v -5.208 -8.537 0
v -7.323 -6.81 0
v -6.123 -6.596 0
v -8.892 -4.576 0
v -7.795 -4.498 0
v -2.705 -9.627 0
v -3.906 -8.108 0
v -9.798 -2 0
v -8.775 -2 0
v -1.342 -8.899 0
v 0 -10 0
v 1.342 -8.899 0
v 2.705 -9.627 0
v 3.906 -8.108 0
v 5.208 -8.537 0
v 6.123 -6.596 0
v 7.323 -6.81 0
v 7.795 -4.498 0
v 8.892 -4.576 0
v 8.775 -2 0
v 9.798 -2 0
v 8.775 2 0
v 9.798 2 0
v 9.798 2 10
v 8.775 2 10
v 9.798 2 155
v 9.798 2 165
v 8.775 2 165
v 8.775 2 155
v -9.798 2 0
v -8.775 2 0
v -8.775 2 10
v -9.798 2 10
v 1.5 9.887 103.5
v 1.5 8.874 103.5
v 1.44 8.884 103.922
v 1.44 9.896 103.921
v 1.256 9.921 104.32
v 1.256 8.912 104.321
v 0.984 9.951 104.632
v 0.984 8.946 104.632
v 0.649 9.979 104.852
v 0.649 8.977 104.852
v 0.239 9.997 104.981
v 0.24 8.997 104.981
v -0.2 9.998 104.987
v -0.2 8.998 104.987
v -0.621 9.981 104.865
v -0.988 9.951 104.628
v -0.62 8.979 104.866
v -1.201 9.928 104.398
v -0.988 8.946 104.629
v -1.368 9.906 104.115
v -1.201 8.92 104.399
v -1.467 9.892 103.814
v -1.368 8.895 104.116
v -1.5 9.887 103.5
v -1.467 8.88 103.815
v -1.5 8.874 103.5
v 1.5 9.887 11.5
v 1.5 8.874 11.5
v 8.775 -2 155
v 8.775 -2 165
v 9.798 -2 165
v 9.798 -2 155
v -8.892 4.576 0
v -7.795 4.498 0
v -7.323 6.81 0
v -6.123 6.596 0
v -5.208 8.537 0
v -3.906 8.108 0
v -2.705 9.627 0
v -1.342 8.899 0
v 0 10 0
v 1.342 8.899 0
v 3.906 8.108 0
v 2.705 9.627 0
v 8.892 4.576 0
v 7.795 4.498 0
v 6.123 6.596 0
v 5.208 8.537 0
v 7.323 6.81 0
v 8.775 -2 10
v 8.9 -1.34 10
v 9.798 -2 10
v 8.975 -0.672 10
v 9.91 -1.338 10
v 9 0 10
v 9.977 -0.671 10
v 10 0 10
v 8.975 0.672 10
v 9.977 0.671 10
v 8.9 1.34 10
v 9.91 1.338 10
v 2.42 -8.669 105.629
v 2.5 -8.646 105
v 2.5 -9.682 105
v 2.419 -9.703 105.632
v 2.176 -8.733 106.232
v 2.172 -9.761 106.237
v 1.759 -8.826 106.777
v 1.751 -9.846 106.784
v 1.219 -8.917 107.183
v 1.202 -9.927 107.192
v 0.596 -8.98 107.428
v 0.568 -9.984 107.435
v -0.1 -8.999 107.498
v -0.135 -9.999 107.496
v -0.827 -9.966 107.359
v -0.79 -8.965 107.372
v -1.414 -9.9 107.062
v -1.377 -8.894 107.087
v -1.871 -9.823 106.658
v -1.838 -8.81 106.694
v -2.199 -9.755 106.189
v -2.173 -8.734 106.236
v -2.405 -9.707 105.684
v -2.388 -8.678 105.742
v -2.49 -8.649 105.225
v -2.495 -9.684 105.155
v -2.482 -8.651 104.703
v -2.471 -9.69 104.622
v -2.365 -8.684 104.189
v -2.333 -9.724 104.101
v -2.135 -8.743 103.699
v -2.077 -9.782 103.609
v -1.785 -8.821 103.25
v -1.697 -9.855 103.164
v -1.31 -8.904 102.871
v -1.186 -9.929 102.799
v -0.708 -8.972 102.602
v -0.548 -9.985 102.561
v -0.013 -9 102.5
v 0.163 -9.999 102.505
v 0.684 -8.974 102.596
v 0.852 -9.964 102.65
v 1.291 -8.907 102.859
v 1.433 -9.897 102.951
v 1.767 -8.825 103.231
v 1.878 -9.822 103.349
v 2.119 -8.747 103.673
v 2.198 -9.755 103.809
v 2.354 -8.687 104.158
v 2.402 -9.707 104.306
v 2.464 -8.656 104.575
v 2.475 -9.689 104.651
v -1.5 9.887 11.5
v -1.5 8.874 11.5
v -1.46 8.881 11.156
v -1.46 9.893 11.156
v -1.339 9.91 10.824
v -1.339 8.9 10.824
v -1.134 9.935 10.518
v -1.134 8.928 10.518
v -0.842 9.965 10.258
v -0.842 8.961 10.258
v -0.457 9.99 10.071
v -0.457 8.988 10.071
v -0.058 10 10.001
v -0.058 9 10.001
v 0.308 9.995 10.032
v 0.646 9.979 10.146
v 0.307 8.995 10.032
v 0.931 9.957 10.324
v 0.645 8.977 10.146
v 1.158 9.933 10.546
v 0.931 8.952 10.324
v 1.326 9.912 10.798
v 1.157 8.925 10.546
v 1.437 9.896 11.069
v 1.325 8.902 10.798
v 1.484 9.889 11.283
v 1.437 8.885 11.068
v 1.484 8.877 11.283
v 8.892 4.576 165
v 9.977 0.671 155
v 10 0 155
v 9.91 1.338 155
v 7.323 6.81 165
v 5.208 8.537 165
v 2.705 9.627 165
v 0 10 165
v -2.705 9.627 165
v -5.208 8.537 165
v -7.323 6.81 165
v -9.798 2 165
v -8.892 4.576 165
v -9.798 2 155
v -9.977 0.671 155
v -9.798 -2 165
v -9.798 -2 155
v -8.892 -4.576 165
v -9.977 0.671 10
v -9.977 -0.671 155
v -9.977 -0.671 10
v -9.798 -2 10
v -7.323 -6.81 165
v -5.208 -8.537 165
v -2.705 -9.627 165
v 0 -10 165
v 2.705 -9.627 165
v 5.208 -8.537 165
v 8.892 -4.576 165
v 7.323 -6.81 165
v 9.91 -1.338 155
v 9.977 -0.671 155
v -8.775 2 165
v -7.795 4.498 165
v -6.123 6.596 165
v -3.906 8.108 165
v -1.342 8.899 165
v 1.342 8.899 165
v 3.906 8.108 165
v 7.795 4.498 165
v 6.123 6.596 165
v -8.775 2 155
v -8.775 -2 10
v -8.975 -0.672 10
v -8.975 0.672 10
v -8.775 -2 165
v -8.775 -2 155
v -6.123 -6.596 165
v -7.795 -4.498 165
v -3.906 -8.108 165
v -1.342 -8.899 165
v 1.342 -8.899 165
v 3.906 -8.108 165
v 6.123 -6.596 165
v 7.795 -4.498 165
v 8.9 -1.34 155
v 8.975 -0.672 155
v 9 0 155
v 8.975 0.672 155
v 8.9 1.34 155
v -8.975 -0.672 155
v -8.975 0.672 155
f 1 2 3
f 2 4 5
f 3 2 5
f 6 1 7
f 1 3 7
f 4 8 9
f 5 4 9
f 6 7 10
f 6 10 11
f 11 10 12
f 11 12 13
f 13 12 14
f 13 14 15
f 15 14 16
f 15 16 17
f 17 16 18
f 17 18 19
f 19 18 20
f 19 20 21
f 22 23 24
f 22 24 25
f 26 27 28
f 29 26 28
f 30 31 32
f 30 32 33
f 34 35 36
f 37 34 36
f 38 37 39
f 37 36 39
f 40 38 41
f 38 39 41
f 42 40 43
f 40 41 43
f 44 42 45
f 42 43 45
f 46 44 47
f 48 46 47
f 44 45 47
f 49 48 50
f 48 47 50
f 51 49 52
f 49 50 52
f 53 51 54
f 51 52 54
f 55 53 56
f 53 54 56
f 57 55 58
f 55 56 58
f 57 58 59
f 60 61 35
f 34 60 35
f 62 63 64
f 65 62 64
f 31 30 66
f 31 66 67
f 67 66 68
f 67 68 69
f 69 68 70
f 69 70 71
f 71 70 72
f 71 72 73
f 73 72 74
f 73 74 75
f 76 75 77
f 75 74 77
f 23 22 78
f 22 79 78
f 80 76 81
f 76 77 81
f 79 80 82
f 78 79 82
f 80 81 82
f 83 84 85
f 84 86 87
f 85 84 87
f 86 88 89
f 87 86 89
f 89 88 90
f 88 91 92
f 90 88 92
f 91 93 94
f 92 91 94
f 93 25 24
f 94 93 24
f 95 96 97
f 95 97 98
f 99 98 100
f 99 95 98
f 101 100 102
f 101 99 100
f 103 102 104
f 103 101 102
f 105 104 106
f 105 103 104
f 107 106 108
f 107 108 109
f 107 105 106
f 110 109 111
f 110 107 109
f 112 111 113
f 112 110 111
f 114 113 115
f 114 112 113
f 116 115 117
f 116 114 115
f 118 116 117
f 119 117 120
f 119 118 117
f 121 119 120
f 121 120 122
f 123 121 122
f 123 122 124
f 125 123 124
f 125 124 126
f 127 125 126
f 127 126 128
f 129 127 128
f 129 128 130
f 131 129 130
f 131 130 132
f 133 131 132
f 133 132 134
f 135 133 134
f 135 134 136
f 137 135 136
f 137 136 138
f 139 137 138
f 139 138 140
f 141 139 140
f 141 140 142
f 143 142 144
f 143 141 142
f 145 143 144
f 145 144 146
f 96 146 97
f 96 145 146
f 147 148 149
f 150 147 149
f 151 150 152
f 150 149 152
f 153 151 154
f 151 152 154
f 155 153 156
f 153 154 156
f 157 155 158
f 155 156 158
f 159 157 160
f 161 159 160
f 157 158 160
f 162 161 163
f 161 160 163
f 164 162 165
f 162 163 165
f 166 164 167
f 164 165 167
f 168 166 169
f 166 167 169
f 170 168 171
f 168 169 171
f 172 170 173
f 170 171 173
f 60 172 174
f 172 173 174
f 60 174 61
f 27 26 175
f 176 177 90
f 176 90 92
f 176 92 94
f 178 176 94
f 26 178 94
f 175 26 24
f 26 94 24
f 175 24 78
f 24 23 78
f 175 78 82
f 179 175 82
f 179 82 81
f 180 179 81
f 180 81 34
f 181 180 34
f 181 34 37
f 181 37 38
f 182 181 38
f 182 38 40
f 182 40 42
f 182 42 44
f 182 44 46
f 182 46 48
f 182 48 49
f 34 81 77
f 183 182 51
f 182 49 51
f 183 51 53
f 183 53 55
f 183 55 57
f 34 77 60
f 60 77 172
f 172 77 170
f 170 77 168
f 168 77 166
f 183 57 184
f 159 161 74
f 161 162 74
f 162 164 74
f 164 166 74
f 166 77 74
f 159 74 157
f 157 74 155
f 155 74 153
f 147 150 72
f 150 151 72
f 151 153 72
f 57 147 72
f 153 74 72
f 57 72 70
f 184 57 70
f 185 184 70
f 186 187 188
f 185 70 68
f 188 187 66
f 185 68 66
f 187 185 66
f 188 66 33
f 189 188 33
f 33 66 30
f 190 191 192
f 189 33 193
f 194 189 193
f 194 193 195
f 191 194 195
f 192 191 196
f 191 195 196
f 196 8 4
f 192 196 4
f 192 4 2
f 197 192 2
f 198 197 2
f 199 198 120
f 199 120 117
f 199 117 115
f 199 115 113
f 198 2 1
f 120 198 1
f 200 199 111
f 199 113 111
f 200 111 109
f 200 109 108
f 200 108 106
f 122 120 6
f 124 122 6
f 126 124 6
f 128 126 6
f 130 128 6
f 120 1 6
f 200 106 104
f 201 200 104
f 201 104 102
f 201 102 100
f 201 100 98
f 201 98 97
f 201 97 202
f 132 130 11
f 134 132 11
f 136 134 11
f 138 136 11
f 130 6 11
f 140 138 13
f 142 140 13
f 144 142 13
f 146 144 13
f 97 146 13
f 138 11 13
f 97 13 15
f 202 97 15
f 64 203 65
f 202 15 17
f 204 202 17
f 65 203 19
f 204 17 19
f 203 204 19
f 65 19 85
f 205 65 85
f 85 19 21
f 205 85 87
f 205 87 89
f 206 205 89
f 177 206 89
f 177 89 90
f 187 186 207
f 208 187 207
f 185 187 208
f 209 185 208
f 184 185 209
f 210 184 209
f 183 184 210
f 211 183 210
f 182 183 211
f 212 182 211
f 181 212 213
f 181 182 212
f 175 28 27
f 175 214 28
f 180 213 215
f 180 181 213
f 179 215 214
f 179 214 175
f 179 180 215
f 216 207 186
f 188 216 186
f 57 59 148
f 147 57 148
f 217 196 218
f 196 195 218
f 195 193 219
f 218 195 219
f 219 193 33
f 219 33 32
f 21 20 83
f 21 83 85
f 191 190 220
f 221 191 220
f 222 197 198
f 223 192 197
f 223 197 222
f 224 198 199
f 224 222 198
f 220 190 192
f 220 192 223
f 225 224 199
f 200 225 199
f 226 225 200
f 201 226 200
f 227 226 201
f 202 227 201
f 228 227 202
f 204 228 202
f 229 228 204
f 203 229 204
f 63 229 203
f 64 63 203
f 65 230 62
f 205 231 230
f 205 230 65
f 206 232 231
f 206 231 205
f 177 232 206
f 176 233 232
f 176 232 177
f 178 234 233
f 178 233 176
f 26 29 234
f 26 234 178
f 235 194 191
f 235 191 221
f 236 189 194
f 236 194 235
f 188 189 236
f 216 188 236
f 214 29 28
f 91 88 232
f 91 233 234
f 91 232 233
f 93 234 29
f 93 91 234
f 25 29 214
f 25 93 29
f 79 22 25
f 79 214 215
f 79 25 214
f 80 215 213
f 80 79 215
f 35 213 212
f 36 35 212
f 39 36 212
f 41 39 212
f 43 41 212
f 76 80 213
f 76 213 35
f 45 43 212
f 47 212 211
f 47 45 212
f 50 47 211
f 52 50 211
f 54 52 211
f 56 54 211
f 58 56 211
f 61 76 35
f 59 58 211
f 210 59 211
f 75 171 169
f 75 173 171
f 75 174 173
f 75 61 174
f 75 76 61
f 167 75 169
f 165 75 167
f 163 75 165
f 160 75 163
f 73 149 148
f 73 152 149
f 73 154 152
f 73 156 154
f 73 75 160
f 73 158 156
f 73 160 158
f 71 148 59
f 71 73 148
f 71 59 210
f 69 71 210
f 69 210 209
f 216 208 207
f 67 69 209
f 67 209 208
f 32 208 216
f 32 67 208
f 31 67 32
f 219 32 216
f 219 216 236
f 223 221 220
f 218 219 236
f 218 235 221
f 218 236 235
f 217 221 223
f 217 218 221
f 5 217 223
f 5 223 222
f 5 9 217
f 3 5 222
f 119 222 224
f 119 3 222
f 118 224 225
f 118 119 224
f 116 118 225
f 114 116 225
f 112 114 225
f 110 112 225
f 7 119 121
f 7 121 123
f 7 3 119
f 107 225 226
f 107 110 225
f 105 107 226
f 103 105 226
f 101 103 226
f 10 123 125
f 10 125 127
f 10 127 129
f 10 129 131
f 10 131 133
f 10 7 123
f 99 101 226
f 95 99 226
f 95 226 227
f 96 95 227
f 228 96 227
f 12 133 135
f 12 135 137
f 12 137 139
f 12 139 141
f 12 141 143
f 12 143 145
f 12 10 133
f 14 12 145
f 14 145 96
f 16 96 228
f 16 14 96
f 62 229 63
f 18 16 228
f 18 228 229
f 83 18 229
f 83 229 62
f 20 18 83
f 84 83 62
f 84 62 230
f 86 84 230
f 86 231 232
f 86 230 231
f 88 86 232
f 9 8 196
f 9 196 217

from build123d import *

# Parameters (mm, degrees)
F0_R     = 10
F0_R_2   = 9
F1_DEPTH = 165
F3_DEPTH = 10
F5_DEPTH = 25
F7_DEPTH = 10
F8_R     = 2.5
F9_DEPTH = 25


with BuildPart() as f1:
    # F0 (on Top) → F1 (new body)
    with BuildSketch(Plane.XY):
        Circle(F0_R)
        Circle(F0_R_2, mode=Mode.SUBTRACT)
    extrude(amount=F1_DEPTH)

    # F2 (on Top) → F3 (cut)
    with BuildSketch(Plane.XY):
        with BuildLine():
            ThreePointArc((9.7979589711, -2), (9.9493615301, -1.0050896201), (10, 0))
            ThreePointArc((10, 0), (9.9493615301, 1.0050896201), (9.7979589711, 2))
            Line((9.7979589711, 2), (-9.7979589711, 2))
            ThreePointArc((-9.7979589711, 2), (-10, 0), (-9.7979589711, -2))
            Line((-9.7979589711, -2), (9.7979589711, -2))
        make_face()
    extrude(amount=F3_DEPTH, mode=Mode.SUBTRACT)

    # F4 (on Front) → F5 (cut)
    with BuildSketch(Plane.XZ):
        with BuildLine():
            ThreePointArc((-1.5, 11.5), (0, 10), (1.5, 11.5))
            ThreePointArc((1.5, 11.5), (0, 13), (-1.5, 11.5))
        make_face()
        with BuildLine():
            ThreePointArc((-1.5, 11.5), (0, 13), (1.5, 11.5))
            Line((1.5, 11.5), (1.5, 103.5))
            ThreePointArc((1.5, 103.5), (0, 102), (-1.5, 103.5))
            Line((-1.5, 103.5), (-1.5, 11.5))
        make_face()
        with BuildLine():
            ThreePointArc((-1.5, 103.5), (0, 102), (1.5, 103.5))
            ThreePointArc((1.5, 103.5), (0, 105), (-1.5, 103.5))
        make_face()
    extrude(amount=-F5_DEPTH, mode=Mode.SUBTRACT)

    # F6 (on face) → F7 (cut)
    with BuildSketch(Plane.XY.offset(165)):
        with BuildLine():
            ThreePointArc((10, 0), (9.9493615301, 1.0050896201), (9.7979589711, 2))
            Line((9.7979589711, 2), (8.7749643874, 2))
            ThreePointArc((8.7749643874, 2), (8.9435641521, 1.0063102189), (9, 0))
            ThreePointArc((9, 0), (8.9435641521, -1.0063102189), (8.7749643874, -2))
            Line((8.7749643874, -2), (9.7979589711, -2))
            ThreePointArc((9.7979589711, -2), (9.9493615301, -1.0050896201), (10, 0))
        make_face()
        with BuildLine():
            Line((-8.7749643874, 2), (-9.7979589711, 2))
            ThreePointArc((-9.7979589711, 2), (-10, 0), (-9.7979589711, -2))
            Line((-9.7979589711, -2), (-8.7749643874, -2))
            ThreePointArc((-8.7749643874, -2), (-9, 0), (-8.7749643874, 2))
        make_face()
    extrude(amount=-F7_DEPTH, mode=Mode.SUBTRACT)

    # F8 (on Front) → F9 (cut)
    with BuildSketch(Plane.XZ):
        with Locations((0, 105)):
            Circle(F8_R)
    extrude(amount=F9_DEPTH, mode=Mode.SUBTRACT)


solid = f1.part
